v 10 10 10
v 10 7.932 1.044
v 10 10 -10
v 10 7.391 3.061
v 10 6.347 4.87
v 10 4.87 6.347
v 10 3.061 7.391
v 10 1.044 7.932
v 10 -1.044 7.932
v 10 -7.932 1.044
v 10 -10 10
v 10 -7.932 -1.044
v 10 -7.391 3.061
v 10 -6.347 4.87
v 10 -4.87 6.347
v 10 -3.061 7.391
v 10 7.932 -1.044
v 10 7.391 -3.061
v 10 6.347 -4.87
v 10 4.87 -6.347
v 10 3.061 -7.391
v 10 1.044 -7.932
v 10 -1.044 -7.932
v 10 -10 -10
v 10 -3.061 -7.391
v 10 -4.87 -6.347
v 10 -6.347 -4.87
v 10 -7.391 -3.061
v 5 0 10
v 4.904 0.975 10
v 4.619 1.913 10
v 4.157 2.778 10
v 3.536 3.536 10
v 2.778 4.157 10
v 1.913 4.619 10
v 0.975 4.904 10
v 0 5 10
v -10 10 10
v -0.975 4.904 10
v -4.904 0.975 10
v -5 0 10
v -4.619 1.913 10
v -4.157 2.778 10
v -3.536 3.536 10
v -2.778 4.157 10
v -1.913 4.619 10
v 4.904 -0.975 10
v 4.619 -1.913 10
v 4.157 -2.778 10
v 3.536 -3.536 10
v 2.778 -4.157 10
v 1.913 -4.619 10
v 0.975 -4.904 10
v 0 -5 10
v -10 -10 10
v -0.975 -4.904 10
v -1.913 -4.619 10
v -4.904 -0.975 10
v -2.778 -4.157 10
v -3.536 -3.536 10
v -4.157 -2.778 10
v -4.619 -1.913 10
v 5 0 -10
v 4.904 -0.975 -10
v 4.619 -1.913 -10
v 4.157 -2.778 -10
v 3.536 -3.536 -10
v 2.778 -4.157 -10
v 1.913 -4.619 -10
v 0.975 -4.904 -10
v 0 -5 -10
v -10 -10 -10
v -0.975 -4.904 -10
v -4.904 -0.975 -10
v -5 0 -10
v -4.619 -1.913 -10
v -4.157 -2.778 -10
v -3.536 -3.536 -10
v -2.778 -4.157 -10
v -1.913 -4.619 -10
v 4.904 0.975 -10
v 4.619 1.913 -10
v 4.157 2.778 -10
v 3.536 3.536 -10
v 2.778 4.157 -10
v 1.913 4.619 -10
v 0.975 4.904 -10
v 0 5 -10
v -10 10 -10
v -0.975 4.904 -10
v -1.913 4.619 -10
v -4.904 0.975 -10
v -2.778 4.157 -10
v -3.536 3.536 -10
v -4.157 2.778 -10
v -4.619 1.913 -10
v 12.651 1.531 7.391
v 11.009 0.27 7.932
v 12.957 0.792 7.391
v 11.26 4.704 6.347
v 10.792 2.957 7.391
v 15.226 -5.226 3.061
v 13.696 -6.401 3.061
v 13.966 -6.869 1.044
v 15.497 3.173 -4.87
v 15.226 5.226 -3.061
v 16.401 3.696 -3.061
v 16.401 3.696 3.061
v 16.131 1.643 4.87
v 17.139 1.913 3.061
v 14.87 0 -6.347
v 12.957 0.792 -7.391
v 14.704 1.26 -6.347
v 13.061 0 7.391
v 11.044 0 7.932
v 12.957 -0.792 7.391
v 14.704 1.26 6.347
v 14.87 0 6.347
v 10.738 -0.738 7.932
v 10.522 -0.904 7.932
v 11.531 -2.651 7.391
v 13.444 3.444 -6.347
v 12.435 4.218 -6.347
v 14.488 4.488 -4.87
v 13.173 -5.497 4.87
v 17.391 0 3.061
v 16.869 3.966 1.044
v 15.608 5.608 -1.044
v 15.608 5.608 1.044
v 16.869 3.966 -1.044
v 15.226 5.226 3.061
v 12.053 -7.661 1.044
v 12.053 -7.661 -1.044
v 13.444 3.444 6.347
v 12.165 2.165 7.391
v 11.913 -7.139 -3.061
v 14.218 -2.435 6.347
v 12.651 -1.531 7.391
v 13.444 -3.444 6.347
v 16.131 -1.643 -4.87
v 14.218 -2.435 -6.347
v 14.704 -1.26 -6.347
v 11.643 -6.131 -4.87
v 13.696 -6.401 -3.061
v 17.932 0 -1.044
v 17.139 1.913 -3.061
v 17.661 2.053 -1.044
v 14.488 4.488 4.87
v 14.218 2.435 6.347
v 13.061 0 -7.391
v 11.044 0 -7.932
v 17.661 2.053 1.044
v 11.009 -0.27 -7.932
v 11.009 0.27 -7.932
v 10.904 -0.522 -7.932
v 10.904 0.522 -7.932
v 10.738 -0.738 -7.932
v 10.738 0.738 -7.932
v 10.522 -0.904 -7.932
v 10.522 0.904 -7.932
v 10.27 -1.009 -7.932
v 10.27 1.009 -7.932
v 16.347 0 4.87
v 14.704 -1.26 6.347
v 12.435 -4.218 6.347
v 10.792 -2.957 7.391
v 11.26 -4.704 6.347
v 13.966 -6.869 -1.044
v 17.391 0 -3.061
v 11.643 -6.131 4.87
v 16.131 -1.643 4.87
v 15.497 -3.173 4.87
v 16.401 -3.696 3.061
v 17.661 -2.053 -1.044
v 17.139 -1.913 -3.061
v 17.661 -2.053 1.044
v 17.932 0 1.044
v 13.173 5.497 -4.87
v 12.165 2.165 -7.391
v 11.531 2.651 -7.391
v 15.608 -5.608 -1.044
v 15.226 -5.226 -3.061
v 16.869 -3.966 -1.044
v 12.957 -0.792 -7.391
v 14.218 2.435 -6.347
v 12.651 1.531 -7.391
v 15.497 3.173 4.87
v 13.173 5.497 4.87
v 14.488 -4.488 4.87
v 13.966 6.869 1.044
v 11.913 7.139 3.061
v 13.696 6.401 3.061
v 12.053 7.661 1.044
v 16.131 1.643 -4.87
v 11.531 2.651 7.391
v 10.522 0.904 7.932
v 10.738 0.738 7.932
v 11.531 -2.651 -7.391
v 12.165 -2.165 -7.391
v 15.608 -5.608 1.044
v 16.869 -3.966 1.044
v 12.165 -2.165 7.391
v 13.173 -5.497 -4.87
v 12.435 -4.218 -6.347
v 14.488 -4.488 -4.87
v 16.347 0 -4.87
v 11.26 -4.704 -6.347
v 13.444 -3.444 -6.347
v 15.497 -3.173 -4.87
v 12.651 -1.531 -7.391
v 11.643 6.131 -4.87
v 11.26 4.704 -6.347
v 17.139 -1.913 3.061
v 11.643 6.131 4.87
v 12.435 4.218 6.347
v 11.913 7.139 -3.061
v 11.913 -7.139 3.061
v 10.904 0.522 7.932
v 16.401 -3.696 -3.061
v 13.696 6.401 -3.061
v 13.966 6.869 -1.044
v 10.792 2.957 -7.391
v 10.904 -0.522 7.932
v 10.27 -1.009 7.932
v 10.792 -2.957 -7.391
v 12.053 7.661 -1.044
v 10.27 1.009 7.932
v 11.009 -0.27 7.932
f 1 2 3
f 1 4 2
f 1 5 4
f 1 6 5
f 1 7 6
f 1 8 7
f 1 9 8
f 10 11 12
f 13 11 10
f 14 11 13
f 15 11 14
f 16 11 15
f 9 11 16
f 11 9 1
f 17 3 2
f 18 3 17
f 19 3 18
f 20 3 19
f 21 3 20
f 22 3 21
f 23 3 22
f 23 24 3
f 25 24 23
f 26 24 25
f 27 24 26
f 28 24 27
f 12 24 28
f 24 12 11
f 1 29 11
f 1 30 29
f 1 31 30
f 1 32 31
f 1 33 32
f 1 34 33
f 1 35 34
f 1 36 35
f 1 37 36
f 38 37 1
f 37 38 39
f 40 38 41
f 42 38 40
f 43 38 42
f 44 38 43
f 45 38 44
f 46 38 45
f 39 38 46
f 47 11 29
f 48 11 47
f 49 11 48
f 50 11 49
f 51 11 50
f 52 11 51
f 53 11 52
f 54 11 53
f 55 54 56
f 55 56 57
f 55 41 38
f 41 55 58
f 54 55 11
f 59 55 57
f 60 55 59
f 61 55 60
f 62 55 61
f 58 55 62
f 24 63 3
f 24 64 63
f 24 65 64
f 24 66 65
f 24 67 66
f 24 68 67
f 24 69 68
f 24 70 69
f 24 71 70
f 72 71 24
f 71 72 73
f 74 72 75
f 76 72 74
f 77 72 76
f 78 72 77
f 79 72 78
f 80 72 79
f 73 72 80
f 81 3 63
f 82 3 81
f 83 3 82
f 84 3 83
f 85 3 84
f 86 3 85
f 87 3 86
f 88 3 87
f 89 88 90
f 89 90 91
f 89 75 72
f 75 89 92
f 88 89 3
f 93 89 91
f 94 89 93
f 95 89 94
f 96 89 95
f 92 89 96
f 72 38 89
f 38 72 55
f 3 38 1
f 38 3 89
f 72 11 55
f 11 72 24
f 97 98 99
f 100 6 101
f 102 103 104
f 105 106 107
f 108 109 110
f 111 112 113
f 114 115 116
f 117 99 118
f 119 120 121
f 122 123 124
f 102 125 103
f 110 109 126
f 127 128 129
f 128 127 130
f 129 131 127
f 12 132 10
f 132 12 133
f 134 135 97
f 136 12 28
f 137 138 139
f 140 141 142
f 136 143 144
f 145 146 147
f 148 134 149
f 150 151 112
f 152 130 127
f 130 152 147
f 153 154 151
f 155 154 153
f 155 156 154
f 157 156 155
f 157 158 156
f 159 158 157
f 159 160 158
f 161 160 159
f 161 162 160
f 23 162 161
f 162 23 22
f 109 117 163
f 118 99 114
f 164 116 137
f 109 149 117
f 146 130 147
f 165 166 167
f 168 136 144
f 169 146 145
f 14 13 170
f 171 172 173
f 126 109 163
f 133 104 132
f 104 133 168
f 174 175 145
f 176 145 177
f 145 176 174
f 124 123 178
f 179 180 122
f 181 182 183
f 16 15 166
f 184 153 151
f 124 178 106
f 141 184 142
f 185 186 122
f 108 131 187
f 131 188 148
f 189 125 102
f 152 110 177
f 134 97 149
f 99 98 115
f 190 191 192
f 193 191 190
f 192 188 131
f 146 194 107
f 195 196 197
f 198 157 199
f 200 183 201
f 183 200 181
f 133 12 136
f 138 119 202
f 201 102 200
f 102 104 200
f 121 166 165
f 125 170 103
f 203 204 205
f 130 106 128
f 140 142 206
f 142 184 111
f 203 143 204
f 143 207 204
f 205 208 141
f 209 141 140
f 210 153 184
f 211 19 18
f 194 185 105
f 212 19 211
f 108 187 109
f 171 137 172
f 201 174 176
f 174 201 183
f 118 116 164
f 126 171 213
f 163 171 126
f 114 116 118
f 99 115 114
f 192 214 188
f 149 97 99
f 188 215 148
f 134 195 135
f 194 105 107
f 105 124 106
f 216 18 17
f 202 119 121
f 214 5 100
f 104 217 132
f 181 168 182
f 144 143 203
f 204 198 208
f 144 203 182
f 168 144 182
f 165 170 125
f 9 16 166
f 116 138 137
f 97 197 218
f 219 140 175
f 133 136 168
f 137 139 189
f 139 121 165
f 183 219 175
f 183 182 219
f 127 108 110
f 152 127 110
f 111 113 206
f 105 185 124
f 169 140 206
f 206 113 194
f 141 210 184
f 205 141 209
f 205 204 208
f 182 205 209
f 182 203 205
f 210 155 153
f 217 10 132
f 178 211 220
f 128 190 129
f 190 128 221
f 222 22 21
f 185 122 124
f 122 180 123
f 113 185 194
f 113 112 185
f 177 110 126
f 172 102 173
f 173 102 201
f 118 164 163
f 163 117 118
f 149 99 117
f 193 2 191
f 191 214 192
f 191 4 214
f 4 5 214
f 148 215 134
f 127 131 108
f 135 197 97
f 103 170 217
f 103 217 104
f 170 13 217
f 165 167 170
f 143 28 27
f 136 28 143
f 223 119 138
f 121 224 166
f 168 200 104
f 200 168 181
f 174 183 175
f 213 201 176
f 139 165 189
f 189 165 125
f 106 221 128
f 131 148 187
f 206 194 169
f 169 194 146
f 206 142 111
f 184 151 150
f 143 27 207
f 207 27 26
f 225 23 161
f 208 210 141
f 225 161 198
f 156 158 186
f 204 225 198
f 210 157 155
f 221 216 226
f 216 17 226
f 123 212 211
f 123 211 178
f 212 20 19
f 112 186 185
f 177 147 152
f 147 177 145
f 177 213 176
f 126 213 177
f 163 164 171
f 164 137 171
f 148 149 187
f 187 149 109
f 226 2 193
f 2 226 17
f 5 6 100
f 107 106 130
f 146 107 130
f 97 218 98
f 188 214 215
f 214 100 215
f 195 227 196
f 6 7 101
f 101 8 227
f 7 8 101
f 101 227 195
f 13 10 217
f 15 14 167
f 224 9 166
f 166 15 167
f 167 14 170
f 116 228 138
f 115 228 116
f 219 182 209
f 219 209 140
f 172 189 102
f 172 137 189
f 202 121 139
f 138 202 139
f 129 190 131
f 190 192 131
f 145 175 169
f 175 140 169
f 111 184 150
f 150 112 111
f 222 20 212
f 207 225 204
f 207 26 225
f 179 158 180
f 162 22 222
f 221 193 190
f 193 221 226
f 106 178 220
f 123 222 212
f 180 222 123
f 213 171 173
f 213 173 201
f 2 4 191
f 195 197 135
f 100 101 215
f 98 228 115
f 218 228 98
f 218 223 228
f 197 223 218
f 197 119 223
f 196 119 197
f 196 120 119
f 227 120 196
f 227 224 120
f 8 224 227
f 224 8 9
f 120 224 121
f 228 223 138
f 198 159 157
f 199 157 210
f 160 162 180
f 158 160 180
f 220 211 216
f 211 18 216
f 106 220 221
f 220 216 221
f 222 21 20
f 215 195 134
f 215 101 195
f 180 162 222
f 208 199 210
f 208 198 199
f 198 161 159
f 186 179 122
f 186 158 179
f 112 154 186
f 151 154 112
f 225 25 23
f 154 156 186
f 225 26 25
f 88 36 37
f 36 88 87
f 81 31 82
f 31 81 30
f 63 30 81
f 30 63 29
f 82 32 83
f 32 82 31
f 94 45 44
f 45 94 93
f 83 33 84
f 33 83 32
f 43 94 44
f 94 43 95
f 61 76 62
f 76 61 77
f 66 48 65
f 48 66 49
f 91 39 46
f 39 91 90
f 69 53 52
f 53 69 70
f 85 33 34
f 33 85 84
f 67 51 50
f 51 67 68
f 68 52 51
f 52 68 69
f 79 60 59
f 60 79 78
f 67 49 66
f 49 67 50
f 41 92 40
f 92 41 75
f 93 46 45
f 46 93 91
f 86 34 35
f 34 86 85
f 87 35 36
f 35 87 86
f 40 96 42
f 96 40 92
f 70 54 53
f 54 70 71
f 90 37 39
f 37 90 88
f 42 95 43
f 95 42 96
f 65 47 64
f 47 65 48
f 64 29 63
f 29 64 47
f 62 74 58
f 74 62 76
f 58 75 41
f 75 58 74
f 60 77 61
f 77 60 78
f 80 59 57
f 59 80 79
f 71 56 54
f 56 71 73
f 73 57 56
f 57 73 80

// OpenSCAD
difference(){ union(){ cube(20, center=true); translate([10,0,0]) sphere(8,$fn=24); } cylinder(h=40, r=5, center=true, $fn=32); }
